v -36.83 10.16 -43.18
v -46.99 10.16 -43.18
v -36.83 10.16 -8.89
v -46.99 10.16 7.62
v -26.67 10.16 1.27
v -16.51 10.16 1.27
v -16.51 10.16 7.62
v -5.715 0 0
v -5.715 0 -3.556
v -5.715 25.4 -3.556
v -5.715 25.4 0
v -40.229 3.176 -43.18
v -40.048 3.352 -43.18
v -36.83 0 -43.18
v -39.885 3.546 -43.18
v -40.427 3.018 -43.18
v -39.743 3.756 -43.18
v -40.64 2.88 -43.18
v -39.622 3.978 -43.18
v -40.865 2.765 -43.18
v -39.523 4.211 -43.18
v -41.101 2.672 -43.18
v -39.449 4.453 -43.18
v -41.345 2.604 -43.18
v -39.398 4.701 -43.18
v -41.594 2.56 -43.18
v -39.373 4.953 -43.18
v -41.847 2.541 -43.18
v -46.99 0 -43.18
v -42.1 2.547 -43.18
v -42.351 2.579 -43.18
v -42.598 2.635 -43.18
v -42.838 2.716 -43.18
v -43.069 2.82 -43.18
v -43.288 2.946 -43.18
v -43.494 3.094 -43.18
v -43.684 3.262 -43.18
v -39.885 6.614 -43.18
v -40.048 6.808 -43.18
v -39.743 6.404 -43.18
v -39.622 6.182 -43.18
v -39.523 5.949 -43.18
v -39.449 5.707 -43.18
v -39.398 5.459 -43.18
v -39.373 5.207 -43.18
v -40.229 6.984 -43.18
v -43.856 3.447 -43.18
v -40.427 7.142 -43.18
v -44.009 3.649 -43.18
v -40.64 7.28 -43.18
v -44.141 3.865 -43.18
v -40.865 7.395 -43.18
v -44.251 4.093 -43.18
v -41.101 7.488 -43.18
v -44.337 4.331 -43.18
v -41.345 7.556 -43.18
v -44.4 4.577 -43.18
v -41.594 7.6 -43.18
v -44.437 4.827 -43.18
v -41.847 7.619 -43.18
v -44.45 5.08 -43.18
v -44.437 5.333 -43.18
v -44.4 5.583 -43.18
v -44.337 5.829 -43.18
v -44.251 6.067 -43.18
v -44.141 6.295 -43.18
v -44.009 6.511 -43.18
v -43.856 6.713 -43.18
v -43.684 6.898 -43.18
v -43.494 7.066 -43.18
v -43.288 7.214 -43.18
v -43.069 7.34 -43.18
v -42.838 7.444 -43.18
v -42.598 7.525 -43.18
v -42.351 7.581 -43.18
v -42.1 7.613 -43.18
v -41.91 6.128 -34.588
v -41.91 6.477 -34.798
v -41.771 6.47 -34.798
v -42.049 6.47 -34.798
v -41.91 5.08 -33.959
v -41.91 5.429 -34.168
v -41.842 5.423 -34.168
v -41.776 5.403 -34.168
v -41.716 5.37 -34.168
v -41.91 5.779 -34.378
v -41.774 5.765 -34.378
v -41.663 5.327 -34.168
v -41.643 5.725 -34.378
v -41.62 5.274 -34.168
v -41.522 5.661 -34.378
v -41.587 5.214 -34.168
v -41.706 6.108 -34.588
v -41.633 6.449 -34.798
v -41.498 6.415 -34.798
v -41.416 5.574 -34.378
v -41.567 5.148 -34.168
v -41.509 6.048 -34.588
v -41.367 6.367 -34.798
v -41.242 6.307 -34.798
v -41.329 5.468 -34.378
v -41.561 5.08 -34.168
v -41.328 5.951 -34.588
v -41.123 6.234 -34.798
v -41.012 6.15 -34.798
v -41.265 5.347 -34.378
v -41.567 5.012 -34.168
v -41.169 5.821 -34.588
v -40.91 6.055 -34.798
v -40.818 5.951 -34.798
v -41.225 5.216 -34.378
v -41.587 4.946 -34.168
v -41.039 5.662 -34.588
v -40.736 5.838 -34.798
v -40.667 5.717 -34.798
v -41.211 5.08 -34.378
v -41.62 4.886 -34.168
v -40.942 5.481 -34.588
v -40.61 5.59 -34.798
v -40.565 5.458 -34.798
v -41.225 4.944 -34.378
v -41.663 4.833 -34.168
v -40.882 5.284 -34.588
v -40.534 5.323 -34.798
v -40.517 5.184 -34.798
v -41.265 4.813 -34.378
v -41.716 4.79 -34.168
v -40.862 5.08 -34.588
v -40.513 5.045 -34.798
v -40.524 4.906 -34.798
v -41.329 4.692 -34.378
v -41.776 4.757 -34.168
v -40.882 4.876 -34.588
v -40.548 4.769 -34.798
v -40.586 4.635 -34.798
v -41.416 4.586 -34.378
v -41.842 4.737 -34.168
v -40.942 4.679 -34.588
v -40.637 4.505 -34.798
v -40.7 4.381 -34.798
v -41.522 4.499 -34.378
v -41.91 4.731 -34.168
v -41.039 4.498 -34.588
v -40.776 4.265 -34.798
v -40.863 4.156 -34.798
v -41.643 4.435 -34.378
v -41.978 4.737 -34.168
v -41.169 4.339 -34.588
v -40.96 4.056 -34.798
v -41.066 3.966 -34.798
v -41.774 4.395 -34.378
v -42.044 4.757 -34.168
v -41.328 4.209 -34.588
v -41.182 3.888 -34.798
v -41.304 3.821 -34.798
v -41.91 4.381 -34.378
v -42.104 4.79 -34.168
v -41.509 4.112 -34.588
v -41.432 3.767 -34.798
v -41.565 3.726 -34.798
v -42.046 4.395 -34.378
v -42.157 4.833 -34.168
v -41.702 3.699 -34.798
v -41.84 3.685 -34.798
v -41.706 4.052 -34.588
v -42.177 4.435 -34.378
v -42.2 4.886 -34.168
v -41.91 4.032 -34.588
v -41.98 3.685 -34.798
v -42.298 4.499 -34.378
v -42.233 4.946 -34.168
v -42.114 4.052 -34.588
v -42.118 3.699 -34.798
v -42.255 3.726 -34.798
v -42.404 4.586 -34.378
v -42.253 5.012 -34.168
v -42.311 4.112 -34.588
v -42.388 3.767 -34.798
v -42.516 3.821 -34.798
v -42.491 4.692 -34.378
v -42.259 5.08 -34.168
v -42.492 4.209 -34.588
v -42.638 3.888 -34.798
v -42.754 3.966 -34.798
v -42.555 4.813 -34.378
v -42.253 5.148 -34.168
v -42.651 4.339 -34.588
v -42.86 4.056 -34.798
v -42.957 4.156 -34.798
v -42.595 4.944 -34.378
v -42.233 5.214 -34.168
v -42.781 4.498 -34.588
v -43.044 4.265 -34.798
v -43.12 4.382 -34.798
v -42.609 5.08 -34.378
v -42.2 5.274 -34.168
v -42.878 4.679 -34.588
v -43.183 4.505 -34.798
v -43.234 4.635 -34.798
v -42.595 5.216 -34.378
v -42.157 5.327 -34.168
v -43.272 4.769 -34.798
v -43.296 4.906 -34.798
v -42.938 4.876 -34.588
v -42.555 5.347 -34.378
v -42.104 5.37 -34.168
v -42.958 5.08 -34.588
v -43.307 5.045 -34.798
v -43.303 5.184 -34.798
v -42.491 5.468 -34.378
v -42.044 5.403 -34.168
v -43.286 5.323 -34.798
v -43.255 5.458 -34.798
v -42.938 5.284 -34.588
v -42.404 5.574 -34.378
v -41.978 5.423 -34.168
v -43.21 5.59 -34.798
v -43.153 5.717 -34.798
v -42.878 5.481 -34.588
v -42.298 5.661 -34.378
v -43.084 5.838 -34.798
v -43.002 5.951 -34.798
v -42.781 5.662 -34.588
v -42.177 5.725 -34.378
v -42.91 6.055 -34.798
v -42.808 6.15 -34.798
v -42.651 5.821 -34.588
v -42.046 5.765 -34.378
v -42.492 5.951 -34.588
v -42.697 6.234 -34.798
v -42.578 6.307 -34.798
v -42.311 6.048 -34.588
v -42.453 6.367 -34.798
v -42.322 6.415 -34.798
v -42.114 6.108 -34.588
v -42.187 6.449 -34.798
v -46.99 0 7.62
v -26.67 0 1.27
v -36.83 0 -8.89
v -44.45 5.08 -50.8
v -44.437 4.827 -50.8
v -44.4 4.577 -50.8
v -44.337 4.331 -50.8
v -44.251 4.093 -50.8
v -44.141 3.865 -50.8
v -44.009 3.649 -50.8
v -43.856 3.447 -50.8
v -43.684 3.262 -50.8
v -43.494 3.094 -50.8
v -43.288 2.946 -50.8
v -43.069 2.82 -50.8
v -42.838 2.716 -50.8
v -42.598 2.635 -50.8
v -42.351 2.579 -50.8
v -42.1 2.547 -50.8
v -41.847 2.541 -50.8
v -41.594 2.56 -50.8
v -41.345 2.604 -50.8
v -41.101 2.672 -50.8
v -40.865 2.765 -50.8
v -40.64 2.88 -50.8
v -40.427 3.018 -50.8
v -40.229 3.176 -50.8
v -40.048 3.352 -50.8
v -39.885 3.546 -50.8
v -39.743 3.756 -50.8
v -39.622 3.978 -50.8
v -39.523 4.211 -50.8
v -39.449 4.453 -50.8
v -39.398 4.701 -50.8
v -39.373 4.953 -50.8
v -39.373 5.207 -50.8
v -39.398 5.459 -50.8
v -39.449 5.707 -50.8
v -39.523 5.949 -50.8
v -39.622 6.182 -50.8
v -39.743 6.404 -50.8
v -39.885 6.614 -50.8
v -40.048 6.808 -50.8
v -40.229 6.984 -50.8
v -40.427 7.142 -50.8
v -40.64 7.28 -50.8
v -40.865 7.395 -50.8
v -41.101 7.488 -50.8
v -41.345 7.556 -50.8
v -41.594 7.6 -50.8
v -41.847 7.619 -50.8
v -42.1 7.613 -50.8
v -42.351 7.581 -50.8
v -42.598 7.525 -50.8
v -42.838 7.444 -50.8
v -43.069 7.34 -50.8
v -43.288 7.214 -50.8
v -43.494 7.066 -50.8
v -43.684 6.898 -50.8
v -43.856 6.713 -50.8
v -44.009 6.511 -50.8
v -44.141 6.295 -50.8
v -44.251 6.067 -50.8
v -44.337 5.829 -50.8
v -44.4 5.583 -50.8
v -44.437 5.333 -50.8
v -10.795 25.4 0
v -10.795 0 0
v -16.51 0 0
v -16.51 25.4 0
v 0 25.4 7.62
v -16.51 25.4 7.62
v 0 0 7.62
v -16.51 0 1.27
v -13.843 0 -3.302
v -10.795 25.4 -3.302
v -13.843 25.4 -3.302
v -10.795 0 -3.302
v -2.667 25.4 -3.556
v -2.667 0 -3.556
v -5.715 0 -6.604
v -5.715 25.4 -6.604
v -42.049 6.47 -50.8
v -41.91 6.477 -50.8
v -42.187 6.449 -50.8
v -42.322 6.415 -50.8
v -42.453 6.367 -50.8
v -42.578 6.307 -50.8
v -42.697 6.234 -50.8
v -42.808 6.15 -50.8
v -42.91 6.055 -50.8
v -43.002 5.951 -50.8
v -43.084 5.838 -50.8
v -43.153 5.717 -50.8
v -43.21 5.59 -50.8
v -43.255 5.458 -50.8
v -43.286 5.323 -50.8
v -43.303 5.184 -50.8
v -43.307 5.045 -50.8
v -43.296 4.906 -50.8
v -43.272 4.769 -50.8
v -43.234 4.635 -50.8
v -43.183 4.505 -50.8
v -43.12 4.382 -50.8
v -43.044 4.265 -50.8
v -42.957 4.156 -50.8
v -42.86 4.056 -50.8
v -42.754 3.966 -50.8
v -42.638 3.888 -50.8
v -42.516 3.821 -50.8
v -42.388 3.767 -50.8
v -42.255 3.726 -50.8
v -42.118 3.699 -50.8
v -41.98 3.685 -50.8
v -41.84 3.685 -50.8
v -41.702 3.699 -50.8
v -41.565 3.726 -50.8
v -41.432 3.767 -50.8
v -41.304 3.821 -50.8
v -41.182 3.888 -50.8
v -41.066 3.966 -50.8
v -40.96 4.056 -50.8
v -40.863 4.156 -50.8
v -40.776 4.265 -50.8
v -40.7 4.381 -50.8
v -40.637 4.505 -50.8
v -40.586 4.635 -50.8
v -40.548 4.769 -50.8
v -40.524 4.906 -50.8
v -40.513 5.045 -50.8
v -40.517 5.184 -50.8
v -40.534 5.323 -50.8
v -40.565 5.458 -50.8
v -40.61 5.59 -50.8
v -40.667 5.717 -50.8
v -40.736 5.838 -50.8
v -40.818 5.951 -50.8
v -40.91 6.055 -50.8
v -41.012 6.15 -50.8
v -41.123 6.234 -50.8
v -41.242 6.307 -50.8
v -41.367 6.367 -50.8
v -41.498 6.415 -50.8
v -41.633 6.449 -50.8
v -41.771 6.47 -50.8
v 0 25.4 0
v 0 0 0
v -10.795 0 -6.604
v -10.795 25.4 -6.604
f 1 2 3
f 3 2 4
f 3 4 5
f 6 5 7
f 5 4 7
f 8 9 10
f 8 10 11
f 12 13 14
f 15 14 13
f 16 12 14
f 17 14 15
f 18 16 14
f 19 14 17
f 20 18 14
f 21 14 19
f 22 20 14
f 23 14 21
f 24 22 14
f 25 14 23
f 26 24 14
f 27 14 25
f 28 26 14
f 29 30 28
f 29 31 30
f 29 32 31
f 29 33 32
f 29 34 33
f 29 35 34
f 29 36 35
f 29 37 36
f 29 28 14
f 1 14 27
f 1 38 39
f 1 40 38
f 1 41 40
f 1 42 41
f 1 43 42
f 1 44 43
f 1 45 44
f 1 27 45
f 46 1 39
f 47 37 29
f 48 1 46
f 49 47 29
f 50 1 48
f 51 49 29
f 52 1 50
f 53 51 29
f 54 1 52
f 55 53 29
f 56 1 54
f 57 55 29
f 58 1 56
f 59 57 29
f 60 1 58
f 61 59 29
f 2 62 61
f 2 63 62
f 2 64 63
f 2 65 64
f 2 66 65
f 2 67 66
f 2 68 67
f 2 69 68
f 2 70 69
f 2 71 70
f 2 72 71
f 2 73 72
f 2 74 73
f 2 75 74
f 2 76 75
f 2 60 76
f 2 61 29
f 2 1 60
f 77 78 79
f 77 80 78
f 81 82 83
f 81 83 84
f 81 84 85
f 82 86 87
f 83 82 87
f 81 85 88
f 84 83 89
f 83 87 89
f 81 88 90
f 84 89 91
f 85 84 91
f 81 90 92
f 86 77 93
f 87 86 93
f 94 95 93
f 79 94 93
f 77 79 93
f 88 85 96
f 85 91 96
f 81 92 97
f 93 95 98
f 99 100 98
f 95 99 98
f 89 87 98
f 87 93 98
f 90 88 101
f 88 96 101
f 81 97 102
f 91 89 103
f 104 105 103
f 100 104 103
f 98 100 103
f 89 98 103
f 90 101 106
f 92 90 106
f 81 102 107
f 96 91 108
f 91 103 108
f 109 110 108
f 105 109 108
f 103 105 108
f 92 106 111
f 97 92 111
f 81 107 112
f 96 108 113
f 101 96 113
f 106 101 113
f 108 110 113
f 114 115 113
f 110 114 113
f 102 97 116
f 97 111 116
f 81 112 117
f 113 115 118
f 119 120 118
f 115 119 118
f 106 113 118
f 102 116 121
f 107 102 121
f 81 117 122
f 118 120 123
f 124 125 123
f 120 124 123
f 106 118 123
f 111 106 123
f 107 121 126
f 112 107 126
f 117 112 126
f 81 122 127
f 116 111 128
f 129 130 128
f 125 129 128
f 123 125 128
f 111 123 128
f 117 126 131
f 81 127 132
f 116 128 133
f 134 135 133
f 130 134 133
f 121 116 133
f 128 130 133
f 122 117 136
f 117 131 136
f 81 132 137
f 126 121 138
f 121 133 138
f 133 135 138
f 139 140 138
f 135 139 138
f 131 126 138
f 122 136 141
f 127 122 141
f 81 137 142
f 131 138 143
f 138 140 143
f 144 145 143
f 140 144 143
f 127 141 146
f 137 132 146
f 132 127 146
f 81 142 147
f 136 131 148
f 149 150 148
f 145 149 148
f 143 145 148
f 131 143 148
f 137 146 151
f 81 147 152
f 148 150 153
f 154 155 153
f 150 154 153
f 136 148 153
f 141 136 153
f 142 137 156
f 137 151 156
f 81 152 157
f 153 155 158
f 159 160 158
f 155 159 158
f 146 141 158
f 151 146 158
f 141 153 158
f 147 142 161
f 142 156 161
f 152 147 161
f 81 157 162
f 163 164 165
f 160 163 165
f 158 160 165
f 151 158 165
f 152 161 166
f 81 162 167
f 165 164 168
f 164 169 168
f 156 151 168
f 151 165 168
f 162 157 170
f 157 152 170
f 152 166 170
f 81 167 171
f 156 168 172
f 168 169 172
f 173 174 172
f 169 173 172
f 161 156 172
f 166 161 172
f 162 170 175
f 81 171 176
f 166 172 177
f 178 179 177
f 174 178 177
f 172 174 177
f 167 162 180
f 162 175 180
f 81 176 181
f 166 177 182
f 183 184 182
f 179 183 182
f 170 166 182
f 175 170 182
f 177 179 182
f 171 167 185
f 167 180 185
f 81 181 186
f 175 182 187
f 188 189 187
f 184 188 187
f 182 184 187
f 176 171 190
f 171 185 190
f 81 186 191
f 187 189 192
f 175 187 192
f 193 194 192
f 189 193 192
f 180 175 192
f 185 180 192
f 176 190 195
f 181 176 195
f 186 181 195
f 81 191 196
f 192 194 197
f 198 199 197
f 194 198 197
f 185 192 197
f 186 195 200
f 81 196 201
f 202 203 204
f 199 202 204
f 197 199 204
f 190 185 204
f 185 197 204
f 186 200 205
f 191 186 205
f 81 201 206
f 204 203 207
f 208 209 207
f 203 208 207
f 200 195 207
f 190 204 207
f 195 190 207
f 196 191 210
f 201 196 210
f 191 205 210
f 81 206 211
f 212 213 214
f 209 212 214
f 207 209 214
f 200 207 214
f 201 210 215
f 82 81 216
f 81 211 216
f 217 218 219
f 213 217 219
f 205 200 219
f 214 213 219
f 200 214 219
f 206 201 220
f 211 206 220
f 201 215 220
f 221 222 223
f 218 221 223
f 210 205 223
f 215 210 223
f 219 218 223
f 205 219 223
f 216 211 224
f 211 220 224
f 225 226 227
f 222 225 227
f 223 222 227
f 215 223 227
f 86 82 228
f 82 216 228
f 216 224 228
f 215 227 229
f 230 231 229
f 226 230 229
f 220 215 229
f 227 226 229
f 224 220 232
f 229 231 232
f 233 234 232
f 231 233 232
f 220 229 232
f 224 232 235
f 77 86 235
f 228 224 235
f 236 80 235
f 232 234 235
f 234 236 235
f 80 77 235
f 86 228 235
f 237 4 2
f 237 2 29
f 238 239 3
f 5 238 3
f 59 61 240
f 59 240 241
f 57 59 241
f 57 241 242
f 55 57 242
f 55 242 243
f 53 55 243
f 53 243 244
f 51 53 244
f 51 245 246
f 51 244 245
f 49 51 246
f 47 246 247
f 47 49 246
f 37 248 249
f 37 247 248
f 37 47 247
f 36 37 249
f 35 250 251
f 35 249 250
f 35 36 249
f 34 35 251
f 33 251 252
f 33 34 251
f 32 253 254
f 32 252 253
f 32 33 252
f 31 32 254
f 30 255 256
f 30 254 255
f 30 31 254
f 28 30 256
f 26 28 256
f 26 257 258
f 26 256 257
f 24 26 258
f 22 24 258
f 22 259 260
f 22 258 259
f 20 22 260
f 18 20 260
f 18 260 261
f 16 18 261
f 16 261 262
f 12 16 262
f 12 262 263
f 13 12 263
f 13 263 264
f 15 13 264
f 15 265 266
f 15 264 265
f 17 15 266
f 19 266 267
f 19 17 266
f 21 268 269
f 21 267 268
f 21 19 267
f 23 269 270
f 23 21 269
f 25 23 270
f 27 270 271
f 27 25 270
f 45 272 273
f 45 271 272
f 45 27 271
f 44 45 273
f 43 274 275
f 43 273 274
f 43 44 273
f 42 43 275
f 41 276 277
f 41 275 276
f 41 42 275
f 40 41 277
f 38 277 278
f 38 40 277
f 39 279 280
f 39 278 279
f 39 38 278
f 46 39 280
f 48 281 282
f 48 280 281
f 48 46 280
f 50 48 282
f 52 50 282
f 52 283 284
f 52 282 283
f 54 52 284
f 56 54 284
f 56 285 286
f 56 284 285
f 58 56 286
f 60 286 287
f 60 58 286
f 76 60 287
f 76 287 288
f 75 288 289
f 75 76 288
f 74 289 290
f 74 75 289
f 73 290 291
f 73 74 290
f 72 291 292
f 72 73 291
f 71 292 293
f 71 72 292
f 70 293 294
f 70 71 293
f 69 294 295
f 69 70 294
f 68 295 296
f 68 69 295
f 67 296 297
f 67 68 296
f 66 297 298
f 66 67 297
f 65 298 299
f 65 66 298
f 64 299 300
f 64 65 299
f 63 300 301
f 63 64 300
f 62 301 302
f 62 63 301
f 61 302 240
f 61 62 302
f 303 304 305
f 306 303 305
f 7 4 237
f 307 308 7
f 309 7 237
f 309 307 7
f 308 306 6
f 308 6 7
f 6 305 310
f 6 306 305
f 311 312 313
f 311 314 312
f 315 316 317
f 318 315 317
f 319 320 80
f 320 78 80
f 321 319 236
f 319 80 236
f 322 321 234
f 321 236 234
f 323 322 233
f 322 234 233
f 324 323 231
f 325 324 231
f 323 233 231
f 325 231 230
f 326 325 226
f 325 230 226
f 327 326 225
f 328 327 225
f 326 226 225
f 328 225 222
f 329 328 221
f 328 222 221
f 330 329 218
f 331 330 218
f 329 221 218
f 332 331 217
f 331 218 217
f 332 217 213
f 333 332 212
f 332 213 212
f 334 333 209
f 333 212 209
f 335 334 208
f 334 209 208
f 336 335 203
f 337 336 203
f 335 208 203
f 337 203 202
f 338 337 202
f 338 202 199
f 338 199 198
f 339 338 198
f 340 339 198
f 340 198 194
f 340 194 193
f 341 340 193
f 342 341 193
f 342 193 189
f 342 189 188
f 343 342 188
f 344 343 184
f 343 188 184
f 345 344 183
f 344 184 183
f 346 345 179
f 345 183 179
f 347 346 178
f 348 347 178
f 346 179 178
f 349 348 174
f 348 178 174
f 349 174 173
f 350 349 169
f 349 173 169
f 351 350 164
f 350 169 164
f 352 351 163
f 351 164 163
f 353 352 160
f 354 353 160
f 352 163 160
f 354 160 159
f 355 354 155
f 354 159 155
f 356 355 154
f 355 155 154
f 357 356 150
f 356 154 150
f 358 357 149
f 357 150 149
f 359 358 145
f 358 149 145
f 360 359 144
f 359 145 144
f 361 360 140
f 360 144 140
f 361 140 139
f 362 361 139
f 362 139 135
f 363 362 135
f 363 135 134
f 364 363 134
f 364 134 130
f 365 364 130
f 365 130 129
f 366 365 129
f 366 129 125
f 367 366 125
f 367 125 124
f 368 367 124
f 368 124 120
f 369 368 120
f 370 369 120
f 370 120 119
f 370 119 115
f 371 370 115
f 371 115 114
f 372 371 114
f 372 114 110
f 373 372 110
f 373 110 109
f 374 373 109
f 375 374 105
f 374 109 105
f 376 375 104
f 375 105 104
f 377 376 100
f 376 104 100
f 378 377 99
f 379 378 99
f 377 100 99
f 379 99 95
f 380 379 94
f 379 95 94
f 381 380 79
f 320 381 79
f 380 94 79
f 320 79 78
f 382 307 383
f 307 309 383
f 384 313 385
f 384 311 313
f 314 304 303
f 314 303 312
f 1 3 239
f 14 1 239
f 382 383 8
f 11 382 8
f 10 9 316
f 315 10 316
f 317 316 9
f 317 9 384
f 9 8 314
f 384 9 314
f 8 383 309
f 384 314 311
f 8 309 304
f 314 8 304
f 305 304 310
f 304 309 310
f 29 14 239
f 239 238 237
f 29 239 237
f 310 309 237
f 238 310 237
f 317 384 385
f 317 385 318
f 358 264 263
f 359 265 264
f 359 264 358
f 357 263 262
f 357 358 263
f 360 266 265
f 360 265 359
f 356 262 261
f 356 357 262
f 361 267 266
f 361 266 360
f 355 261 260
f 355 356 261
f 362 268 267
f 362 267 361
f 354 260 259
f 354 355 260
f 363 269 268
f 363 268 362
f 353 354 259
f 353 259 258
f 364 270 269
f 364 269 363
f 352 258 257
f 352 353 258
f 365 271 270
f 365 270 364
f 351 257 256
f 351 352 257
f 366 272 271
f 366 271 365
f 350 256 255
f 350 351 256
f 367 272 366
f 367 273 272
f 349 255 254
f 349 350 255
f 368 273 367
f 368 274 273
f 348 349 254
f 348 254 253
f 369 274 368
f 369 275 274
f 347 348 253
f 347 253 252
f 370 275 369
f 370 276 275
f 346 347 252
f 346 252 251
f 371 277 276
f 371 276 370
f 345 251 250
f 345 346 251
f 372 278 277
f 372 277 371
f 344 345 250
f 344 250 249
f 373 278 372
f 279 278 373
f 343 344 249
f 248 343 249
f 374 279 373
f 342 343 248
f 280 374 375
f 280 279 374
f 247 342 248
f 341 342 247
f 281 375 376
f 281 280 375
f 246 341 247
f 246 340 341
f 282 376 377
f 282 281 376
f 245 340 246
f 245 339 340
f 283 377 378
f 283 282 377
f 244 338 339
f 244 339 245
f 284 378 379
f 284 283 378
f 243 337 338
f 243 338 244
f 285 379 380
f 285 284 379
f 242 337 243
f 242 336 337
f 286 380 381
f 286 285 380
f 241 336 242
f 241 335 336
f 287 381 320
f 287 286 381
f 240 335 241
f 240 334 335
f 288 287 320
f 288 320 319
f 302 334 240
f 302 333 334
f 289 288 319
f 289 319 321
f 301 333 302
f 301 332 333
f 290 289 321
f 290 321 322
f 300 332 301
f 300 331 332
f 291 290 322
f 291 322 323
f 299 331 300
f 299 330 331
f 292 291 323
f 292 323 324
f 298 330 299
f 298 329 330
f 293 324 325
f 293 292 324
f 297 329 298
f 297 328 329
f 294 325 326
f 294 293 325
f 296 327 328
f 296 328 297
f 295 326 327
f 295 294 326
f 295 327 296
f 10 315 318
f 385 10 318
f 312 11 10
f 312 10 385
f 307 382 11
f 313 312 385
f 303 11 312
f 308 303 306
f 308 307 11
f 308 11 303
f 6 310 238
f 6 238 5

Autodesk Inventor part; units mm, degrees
ref_plane "YZ Plane" through (0, 0, 0) normal (1, 0, 0) x (0, 1, 0)
ref_plane "XZ Plane" through (0, 0, 0) normal (0, 1, 0) x (-1, 0, 0)
ref_plane "XY Plane" through (0, 0, 0) normal (0, 0, 1) x (1, 0, 0)
sketch "Sketch1" plane through (0, 0, 0) normal (0, 1, 0) x (-1, 0, 0)
  line L0 (0, 0) -> (16.51, 0)
  line L1 (16.51, 0) -> (16.51, 7.62)
  line L2 (16.51, 7.62) -> (0, 7.62)
  line L3 (0, 7.62) -> (0, 0)
  line L4 (16.51, 0) -> (10.795, 0)
  line L5 (10.795, 0) -> (10.795, -6.604)
  line L6 (10.795, -6.604) -> (5.715, -6.604)
  line L7 (5.715, -6.604) -> (5.715, 0)
  line L8 (5.715, -6.604) -> (5.715, -3.556)
  line L9 (5.715, -3.556) -> (2.667, -3.556)
  line L10 (2.667, -3.556) -> (5.715, -6.604)
  line L11 (10.795, -3.302) -> (13.843, -3.302)
  line L12 (13.843, -3.302) -> (10.795, -6.604)
  dimension "d0" = 16.51
  dimension "d1" = 7.62
  dimension "d2" = 5.715
  dimension "d3" = 6.604
  dimension "d4" = 5.08
  dimension "d5" = 3.048
  dimension "d6" = 3.048
  dimension "d7" = 3.048
extrude "Extrusion1" add sketch "Sketch1" along normal blind 25.4
sketch "Sketch3" plane through (-16.51, 0, 0) normal (-1, 0, 0) x (0, 0, 1)
  line L0 (0, 0) -> (7.62, 0) projected
  line L1 (7.62, 0) -> (1.27, 0)
  line L2 (1.27, 0) -> (1.27, 10.16)
  line L3 (1.27, 10.16) -> (7.62, 10.16)
  line L4 (7.62, 10.16) -> (7.62, 0)
  dimension "d10" = 6.35
  dimension "d11" = 10.16
extrude "Extrusion2" add sketch "Sketch3" along normal blind 30.48
sketch "Sketch4" plane through (-16.51, 0, 1.27) normal (0, 0, -1) x (-1, 0, 0)
  line L0 (30.48, 10.16) -> (30.48, 0) projected
  line L1 (30.48, 10.16) -> (20.32, 10.16)
  line L2 (20.32, 10.16) -> (20.32, 0)
  line L3 (20.32, 0) -> (30.48, 0)
  line L4 (30.48, 0) -> (30.48, 10.16)
  point P0 (-16.51, 0)
  dimension "d14" = 10.16
  dimension "d15" = 10.16
extrude "Extrusion3" add sketch "Sketch4" along normal blind 44.45
sketch "Sketch5" plane through (-16.51, 0, -43.18) normal (0, 0, -1) x (-1, 0, 0)
  line L0 (30.48, 0) -> (30.48, 10.16) projected
  line L1 (30.48, 5.08) -> (25.4, 5.08)
  circle A0 centre (25.4, 5.08) radius 2.54
  point P0 (-16.51, 0)
  dimension "d18" = 5.08
  dimension "d19" = 5.08
extrude "Extrusion4" add sketch "Sketch5" along normal blind 7.62
sketch "Sketch6" plane through (-41.91, 5.08, -50.8) normal (0, 0, -1) x (-1, 0, 0)
  circle A0 centre (0, 0) radius 2.54 projected
  line L0 (2.54, 0) -> (0, 0)
  point P0 (-41.91, -5.08)
hole "Hole1" at (-41.91, 5.08, -50.8) direction (0, 0, 1) diameter 2.794 depth 16.002 tip angle 118
sketch "Sketch7" plane through (-16.51, 0, 1.27) normal (0, 0, -1) x (-1, 0, 0)
  line L0 (20.32, 0) -> (20.32, 10.16) projected
  line L1 (0, 0) -> (20.32, 0) projected
  line L2 (20.32, 10.16) -> (10.16, 10.16)
  line L3 (10.16, 10.16) -> (10.16, 0)
  line L4 (10.16, 0) -> (20.32, 0)
  line L5 (20.32, 0) -> (20.32, 10.16)
  point P0 (-16.51, 0)
  dimension "d29" = 10.16
extrude "Extrusion5" add sketch "Sketch7" along normal blind 10.16
chamfer "Chamfer1" distance 10.16 angle 45 1 edges at (-26.67, 5.08, -8.89)
properties part number "Grab Rail v2.5 - Left"
